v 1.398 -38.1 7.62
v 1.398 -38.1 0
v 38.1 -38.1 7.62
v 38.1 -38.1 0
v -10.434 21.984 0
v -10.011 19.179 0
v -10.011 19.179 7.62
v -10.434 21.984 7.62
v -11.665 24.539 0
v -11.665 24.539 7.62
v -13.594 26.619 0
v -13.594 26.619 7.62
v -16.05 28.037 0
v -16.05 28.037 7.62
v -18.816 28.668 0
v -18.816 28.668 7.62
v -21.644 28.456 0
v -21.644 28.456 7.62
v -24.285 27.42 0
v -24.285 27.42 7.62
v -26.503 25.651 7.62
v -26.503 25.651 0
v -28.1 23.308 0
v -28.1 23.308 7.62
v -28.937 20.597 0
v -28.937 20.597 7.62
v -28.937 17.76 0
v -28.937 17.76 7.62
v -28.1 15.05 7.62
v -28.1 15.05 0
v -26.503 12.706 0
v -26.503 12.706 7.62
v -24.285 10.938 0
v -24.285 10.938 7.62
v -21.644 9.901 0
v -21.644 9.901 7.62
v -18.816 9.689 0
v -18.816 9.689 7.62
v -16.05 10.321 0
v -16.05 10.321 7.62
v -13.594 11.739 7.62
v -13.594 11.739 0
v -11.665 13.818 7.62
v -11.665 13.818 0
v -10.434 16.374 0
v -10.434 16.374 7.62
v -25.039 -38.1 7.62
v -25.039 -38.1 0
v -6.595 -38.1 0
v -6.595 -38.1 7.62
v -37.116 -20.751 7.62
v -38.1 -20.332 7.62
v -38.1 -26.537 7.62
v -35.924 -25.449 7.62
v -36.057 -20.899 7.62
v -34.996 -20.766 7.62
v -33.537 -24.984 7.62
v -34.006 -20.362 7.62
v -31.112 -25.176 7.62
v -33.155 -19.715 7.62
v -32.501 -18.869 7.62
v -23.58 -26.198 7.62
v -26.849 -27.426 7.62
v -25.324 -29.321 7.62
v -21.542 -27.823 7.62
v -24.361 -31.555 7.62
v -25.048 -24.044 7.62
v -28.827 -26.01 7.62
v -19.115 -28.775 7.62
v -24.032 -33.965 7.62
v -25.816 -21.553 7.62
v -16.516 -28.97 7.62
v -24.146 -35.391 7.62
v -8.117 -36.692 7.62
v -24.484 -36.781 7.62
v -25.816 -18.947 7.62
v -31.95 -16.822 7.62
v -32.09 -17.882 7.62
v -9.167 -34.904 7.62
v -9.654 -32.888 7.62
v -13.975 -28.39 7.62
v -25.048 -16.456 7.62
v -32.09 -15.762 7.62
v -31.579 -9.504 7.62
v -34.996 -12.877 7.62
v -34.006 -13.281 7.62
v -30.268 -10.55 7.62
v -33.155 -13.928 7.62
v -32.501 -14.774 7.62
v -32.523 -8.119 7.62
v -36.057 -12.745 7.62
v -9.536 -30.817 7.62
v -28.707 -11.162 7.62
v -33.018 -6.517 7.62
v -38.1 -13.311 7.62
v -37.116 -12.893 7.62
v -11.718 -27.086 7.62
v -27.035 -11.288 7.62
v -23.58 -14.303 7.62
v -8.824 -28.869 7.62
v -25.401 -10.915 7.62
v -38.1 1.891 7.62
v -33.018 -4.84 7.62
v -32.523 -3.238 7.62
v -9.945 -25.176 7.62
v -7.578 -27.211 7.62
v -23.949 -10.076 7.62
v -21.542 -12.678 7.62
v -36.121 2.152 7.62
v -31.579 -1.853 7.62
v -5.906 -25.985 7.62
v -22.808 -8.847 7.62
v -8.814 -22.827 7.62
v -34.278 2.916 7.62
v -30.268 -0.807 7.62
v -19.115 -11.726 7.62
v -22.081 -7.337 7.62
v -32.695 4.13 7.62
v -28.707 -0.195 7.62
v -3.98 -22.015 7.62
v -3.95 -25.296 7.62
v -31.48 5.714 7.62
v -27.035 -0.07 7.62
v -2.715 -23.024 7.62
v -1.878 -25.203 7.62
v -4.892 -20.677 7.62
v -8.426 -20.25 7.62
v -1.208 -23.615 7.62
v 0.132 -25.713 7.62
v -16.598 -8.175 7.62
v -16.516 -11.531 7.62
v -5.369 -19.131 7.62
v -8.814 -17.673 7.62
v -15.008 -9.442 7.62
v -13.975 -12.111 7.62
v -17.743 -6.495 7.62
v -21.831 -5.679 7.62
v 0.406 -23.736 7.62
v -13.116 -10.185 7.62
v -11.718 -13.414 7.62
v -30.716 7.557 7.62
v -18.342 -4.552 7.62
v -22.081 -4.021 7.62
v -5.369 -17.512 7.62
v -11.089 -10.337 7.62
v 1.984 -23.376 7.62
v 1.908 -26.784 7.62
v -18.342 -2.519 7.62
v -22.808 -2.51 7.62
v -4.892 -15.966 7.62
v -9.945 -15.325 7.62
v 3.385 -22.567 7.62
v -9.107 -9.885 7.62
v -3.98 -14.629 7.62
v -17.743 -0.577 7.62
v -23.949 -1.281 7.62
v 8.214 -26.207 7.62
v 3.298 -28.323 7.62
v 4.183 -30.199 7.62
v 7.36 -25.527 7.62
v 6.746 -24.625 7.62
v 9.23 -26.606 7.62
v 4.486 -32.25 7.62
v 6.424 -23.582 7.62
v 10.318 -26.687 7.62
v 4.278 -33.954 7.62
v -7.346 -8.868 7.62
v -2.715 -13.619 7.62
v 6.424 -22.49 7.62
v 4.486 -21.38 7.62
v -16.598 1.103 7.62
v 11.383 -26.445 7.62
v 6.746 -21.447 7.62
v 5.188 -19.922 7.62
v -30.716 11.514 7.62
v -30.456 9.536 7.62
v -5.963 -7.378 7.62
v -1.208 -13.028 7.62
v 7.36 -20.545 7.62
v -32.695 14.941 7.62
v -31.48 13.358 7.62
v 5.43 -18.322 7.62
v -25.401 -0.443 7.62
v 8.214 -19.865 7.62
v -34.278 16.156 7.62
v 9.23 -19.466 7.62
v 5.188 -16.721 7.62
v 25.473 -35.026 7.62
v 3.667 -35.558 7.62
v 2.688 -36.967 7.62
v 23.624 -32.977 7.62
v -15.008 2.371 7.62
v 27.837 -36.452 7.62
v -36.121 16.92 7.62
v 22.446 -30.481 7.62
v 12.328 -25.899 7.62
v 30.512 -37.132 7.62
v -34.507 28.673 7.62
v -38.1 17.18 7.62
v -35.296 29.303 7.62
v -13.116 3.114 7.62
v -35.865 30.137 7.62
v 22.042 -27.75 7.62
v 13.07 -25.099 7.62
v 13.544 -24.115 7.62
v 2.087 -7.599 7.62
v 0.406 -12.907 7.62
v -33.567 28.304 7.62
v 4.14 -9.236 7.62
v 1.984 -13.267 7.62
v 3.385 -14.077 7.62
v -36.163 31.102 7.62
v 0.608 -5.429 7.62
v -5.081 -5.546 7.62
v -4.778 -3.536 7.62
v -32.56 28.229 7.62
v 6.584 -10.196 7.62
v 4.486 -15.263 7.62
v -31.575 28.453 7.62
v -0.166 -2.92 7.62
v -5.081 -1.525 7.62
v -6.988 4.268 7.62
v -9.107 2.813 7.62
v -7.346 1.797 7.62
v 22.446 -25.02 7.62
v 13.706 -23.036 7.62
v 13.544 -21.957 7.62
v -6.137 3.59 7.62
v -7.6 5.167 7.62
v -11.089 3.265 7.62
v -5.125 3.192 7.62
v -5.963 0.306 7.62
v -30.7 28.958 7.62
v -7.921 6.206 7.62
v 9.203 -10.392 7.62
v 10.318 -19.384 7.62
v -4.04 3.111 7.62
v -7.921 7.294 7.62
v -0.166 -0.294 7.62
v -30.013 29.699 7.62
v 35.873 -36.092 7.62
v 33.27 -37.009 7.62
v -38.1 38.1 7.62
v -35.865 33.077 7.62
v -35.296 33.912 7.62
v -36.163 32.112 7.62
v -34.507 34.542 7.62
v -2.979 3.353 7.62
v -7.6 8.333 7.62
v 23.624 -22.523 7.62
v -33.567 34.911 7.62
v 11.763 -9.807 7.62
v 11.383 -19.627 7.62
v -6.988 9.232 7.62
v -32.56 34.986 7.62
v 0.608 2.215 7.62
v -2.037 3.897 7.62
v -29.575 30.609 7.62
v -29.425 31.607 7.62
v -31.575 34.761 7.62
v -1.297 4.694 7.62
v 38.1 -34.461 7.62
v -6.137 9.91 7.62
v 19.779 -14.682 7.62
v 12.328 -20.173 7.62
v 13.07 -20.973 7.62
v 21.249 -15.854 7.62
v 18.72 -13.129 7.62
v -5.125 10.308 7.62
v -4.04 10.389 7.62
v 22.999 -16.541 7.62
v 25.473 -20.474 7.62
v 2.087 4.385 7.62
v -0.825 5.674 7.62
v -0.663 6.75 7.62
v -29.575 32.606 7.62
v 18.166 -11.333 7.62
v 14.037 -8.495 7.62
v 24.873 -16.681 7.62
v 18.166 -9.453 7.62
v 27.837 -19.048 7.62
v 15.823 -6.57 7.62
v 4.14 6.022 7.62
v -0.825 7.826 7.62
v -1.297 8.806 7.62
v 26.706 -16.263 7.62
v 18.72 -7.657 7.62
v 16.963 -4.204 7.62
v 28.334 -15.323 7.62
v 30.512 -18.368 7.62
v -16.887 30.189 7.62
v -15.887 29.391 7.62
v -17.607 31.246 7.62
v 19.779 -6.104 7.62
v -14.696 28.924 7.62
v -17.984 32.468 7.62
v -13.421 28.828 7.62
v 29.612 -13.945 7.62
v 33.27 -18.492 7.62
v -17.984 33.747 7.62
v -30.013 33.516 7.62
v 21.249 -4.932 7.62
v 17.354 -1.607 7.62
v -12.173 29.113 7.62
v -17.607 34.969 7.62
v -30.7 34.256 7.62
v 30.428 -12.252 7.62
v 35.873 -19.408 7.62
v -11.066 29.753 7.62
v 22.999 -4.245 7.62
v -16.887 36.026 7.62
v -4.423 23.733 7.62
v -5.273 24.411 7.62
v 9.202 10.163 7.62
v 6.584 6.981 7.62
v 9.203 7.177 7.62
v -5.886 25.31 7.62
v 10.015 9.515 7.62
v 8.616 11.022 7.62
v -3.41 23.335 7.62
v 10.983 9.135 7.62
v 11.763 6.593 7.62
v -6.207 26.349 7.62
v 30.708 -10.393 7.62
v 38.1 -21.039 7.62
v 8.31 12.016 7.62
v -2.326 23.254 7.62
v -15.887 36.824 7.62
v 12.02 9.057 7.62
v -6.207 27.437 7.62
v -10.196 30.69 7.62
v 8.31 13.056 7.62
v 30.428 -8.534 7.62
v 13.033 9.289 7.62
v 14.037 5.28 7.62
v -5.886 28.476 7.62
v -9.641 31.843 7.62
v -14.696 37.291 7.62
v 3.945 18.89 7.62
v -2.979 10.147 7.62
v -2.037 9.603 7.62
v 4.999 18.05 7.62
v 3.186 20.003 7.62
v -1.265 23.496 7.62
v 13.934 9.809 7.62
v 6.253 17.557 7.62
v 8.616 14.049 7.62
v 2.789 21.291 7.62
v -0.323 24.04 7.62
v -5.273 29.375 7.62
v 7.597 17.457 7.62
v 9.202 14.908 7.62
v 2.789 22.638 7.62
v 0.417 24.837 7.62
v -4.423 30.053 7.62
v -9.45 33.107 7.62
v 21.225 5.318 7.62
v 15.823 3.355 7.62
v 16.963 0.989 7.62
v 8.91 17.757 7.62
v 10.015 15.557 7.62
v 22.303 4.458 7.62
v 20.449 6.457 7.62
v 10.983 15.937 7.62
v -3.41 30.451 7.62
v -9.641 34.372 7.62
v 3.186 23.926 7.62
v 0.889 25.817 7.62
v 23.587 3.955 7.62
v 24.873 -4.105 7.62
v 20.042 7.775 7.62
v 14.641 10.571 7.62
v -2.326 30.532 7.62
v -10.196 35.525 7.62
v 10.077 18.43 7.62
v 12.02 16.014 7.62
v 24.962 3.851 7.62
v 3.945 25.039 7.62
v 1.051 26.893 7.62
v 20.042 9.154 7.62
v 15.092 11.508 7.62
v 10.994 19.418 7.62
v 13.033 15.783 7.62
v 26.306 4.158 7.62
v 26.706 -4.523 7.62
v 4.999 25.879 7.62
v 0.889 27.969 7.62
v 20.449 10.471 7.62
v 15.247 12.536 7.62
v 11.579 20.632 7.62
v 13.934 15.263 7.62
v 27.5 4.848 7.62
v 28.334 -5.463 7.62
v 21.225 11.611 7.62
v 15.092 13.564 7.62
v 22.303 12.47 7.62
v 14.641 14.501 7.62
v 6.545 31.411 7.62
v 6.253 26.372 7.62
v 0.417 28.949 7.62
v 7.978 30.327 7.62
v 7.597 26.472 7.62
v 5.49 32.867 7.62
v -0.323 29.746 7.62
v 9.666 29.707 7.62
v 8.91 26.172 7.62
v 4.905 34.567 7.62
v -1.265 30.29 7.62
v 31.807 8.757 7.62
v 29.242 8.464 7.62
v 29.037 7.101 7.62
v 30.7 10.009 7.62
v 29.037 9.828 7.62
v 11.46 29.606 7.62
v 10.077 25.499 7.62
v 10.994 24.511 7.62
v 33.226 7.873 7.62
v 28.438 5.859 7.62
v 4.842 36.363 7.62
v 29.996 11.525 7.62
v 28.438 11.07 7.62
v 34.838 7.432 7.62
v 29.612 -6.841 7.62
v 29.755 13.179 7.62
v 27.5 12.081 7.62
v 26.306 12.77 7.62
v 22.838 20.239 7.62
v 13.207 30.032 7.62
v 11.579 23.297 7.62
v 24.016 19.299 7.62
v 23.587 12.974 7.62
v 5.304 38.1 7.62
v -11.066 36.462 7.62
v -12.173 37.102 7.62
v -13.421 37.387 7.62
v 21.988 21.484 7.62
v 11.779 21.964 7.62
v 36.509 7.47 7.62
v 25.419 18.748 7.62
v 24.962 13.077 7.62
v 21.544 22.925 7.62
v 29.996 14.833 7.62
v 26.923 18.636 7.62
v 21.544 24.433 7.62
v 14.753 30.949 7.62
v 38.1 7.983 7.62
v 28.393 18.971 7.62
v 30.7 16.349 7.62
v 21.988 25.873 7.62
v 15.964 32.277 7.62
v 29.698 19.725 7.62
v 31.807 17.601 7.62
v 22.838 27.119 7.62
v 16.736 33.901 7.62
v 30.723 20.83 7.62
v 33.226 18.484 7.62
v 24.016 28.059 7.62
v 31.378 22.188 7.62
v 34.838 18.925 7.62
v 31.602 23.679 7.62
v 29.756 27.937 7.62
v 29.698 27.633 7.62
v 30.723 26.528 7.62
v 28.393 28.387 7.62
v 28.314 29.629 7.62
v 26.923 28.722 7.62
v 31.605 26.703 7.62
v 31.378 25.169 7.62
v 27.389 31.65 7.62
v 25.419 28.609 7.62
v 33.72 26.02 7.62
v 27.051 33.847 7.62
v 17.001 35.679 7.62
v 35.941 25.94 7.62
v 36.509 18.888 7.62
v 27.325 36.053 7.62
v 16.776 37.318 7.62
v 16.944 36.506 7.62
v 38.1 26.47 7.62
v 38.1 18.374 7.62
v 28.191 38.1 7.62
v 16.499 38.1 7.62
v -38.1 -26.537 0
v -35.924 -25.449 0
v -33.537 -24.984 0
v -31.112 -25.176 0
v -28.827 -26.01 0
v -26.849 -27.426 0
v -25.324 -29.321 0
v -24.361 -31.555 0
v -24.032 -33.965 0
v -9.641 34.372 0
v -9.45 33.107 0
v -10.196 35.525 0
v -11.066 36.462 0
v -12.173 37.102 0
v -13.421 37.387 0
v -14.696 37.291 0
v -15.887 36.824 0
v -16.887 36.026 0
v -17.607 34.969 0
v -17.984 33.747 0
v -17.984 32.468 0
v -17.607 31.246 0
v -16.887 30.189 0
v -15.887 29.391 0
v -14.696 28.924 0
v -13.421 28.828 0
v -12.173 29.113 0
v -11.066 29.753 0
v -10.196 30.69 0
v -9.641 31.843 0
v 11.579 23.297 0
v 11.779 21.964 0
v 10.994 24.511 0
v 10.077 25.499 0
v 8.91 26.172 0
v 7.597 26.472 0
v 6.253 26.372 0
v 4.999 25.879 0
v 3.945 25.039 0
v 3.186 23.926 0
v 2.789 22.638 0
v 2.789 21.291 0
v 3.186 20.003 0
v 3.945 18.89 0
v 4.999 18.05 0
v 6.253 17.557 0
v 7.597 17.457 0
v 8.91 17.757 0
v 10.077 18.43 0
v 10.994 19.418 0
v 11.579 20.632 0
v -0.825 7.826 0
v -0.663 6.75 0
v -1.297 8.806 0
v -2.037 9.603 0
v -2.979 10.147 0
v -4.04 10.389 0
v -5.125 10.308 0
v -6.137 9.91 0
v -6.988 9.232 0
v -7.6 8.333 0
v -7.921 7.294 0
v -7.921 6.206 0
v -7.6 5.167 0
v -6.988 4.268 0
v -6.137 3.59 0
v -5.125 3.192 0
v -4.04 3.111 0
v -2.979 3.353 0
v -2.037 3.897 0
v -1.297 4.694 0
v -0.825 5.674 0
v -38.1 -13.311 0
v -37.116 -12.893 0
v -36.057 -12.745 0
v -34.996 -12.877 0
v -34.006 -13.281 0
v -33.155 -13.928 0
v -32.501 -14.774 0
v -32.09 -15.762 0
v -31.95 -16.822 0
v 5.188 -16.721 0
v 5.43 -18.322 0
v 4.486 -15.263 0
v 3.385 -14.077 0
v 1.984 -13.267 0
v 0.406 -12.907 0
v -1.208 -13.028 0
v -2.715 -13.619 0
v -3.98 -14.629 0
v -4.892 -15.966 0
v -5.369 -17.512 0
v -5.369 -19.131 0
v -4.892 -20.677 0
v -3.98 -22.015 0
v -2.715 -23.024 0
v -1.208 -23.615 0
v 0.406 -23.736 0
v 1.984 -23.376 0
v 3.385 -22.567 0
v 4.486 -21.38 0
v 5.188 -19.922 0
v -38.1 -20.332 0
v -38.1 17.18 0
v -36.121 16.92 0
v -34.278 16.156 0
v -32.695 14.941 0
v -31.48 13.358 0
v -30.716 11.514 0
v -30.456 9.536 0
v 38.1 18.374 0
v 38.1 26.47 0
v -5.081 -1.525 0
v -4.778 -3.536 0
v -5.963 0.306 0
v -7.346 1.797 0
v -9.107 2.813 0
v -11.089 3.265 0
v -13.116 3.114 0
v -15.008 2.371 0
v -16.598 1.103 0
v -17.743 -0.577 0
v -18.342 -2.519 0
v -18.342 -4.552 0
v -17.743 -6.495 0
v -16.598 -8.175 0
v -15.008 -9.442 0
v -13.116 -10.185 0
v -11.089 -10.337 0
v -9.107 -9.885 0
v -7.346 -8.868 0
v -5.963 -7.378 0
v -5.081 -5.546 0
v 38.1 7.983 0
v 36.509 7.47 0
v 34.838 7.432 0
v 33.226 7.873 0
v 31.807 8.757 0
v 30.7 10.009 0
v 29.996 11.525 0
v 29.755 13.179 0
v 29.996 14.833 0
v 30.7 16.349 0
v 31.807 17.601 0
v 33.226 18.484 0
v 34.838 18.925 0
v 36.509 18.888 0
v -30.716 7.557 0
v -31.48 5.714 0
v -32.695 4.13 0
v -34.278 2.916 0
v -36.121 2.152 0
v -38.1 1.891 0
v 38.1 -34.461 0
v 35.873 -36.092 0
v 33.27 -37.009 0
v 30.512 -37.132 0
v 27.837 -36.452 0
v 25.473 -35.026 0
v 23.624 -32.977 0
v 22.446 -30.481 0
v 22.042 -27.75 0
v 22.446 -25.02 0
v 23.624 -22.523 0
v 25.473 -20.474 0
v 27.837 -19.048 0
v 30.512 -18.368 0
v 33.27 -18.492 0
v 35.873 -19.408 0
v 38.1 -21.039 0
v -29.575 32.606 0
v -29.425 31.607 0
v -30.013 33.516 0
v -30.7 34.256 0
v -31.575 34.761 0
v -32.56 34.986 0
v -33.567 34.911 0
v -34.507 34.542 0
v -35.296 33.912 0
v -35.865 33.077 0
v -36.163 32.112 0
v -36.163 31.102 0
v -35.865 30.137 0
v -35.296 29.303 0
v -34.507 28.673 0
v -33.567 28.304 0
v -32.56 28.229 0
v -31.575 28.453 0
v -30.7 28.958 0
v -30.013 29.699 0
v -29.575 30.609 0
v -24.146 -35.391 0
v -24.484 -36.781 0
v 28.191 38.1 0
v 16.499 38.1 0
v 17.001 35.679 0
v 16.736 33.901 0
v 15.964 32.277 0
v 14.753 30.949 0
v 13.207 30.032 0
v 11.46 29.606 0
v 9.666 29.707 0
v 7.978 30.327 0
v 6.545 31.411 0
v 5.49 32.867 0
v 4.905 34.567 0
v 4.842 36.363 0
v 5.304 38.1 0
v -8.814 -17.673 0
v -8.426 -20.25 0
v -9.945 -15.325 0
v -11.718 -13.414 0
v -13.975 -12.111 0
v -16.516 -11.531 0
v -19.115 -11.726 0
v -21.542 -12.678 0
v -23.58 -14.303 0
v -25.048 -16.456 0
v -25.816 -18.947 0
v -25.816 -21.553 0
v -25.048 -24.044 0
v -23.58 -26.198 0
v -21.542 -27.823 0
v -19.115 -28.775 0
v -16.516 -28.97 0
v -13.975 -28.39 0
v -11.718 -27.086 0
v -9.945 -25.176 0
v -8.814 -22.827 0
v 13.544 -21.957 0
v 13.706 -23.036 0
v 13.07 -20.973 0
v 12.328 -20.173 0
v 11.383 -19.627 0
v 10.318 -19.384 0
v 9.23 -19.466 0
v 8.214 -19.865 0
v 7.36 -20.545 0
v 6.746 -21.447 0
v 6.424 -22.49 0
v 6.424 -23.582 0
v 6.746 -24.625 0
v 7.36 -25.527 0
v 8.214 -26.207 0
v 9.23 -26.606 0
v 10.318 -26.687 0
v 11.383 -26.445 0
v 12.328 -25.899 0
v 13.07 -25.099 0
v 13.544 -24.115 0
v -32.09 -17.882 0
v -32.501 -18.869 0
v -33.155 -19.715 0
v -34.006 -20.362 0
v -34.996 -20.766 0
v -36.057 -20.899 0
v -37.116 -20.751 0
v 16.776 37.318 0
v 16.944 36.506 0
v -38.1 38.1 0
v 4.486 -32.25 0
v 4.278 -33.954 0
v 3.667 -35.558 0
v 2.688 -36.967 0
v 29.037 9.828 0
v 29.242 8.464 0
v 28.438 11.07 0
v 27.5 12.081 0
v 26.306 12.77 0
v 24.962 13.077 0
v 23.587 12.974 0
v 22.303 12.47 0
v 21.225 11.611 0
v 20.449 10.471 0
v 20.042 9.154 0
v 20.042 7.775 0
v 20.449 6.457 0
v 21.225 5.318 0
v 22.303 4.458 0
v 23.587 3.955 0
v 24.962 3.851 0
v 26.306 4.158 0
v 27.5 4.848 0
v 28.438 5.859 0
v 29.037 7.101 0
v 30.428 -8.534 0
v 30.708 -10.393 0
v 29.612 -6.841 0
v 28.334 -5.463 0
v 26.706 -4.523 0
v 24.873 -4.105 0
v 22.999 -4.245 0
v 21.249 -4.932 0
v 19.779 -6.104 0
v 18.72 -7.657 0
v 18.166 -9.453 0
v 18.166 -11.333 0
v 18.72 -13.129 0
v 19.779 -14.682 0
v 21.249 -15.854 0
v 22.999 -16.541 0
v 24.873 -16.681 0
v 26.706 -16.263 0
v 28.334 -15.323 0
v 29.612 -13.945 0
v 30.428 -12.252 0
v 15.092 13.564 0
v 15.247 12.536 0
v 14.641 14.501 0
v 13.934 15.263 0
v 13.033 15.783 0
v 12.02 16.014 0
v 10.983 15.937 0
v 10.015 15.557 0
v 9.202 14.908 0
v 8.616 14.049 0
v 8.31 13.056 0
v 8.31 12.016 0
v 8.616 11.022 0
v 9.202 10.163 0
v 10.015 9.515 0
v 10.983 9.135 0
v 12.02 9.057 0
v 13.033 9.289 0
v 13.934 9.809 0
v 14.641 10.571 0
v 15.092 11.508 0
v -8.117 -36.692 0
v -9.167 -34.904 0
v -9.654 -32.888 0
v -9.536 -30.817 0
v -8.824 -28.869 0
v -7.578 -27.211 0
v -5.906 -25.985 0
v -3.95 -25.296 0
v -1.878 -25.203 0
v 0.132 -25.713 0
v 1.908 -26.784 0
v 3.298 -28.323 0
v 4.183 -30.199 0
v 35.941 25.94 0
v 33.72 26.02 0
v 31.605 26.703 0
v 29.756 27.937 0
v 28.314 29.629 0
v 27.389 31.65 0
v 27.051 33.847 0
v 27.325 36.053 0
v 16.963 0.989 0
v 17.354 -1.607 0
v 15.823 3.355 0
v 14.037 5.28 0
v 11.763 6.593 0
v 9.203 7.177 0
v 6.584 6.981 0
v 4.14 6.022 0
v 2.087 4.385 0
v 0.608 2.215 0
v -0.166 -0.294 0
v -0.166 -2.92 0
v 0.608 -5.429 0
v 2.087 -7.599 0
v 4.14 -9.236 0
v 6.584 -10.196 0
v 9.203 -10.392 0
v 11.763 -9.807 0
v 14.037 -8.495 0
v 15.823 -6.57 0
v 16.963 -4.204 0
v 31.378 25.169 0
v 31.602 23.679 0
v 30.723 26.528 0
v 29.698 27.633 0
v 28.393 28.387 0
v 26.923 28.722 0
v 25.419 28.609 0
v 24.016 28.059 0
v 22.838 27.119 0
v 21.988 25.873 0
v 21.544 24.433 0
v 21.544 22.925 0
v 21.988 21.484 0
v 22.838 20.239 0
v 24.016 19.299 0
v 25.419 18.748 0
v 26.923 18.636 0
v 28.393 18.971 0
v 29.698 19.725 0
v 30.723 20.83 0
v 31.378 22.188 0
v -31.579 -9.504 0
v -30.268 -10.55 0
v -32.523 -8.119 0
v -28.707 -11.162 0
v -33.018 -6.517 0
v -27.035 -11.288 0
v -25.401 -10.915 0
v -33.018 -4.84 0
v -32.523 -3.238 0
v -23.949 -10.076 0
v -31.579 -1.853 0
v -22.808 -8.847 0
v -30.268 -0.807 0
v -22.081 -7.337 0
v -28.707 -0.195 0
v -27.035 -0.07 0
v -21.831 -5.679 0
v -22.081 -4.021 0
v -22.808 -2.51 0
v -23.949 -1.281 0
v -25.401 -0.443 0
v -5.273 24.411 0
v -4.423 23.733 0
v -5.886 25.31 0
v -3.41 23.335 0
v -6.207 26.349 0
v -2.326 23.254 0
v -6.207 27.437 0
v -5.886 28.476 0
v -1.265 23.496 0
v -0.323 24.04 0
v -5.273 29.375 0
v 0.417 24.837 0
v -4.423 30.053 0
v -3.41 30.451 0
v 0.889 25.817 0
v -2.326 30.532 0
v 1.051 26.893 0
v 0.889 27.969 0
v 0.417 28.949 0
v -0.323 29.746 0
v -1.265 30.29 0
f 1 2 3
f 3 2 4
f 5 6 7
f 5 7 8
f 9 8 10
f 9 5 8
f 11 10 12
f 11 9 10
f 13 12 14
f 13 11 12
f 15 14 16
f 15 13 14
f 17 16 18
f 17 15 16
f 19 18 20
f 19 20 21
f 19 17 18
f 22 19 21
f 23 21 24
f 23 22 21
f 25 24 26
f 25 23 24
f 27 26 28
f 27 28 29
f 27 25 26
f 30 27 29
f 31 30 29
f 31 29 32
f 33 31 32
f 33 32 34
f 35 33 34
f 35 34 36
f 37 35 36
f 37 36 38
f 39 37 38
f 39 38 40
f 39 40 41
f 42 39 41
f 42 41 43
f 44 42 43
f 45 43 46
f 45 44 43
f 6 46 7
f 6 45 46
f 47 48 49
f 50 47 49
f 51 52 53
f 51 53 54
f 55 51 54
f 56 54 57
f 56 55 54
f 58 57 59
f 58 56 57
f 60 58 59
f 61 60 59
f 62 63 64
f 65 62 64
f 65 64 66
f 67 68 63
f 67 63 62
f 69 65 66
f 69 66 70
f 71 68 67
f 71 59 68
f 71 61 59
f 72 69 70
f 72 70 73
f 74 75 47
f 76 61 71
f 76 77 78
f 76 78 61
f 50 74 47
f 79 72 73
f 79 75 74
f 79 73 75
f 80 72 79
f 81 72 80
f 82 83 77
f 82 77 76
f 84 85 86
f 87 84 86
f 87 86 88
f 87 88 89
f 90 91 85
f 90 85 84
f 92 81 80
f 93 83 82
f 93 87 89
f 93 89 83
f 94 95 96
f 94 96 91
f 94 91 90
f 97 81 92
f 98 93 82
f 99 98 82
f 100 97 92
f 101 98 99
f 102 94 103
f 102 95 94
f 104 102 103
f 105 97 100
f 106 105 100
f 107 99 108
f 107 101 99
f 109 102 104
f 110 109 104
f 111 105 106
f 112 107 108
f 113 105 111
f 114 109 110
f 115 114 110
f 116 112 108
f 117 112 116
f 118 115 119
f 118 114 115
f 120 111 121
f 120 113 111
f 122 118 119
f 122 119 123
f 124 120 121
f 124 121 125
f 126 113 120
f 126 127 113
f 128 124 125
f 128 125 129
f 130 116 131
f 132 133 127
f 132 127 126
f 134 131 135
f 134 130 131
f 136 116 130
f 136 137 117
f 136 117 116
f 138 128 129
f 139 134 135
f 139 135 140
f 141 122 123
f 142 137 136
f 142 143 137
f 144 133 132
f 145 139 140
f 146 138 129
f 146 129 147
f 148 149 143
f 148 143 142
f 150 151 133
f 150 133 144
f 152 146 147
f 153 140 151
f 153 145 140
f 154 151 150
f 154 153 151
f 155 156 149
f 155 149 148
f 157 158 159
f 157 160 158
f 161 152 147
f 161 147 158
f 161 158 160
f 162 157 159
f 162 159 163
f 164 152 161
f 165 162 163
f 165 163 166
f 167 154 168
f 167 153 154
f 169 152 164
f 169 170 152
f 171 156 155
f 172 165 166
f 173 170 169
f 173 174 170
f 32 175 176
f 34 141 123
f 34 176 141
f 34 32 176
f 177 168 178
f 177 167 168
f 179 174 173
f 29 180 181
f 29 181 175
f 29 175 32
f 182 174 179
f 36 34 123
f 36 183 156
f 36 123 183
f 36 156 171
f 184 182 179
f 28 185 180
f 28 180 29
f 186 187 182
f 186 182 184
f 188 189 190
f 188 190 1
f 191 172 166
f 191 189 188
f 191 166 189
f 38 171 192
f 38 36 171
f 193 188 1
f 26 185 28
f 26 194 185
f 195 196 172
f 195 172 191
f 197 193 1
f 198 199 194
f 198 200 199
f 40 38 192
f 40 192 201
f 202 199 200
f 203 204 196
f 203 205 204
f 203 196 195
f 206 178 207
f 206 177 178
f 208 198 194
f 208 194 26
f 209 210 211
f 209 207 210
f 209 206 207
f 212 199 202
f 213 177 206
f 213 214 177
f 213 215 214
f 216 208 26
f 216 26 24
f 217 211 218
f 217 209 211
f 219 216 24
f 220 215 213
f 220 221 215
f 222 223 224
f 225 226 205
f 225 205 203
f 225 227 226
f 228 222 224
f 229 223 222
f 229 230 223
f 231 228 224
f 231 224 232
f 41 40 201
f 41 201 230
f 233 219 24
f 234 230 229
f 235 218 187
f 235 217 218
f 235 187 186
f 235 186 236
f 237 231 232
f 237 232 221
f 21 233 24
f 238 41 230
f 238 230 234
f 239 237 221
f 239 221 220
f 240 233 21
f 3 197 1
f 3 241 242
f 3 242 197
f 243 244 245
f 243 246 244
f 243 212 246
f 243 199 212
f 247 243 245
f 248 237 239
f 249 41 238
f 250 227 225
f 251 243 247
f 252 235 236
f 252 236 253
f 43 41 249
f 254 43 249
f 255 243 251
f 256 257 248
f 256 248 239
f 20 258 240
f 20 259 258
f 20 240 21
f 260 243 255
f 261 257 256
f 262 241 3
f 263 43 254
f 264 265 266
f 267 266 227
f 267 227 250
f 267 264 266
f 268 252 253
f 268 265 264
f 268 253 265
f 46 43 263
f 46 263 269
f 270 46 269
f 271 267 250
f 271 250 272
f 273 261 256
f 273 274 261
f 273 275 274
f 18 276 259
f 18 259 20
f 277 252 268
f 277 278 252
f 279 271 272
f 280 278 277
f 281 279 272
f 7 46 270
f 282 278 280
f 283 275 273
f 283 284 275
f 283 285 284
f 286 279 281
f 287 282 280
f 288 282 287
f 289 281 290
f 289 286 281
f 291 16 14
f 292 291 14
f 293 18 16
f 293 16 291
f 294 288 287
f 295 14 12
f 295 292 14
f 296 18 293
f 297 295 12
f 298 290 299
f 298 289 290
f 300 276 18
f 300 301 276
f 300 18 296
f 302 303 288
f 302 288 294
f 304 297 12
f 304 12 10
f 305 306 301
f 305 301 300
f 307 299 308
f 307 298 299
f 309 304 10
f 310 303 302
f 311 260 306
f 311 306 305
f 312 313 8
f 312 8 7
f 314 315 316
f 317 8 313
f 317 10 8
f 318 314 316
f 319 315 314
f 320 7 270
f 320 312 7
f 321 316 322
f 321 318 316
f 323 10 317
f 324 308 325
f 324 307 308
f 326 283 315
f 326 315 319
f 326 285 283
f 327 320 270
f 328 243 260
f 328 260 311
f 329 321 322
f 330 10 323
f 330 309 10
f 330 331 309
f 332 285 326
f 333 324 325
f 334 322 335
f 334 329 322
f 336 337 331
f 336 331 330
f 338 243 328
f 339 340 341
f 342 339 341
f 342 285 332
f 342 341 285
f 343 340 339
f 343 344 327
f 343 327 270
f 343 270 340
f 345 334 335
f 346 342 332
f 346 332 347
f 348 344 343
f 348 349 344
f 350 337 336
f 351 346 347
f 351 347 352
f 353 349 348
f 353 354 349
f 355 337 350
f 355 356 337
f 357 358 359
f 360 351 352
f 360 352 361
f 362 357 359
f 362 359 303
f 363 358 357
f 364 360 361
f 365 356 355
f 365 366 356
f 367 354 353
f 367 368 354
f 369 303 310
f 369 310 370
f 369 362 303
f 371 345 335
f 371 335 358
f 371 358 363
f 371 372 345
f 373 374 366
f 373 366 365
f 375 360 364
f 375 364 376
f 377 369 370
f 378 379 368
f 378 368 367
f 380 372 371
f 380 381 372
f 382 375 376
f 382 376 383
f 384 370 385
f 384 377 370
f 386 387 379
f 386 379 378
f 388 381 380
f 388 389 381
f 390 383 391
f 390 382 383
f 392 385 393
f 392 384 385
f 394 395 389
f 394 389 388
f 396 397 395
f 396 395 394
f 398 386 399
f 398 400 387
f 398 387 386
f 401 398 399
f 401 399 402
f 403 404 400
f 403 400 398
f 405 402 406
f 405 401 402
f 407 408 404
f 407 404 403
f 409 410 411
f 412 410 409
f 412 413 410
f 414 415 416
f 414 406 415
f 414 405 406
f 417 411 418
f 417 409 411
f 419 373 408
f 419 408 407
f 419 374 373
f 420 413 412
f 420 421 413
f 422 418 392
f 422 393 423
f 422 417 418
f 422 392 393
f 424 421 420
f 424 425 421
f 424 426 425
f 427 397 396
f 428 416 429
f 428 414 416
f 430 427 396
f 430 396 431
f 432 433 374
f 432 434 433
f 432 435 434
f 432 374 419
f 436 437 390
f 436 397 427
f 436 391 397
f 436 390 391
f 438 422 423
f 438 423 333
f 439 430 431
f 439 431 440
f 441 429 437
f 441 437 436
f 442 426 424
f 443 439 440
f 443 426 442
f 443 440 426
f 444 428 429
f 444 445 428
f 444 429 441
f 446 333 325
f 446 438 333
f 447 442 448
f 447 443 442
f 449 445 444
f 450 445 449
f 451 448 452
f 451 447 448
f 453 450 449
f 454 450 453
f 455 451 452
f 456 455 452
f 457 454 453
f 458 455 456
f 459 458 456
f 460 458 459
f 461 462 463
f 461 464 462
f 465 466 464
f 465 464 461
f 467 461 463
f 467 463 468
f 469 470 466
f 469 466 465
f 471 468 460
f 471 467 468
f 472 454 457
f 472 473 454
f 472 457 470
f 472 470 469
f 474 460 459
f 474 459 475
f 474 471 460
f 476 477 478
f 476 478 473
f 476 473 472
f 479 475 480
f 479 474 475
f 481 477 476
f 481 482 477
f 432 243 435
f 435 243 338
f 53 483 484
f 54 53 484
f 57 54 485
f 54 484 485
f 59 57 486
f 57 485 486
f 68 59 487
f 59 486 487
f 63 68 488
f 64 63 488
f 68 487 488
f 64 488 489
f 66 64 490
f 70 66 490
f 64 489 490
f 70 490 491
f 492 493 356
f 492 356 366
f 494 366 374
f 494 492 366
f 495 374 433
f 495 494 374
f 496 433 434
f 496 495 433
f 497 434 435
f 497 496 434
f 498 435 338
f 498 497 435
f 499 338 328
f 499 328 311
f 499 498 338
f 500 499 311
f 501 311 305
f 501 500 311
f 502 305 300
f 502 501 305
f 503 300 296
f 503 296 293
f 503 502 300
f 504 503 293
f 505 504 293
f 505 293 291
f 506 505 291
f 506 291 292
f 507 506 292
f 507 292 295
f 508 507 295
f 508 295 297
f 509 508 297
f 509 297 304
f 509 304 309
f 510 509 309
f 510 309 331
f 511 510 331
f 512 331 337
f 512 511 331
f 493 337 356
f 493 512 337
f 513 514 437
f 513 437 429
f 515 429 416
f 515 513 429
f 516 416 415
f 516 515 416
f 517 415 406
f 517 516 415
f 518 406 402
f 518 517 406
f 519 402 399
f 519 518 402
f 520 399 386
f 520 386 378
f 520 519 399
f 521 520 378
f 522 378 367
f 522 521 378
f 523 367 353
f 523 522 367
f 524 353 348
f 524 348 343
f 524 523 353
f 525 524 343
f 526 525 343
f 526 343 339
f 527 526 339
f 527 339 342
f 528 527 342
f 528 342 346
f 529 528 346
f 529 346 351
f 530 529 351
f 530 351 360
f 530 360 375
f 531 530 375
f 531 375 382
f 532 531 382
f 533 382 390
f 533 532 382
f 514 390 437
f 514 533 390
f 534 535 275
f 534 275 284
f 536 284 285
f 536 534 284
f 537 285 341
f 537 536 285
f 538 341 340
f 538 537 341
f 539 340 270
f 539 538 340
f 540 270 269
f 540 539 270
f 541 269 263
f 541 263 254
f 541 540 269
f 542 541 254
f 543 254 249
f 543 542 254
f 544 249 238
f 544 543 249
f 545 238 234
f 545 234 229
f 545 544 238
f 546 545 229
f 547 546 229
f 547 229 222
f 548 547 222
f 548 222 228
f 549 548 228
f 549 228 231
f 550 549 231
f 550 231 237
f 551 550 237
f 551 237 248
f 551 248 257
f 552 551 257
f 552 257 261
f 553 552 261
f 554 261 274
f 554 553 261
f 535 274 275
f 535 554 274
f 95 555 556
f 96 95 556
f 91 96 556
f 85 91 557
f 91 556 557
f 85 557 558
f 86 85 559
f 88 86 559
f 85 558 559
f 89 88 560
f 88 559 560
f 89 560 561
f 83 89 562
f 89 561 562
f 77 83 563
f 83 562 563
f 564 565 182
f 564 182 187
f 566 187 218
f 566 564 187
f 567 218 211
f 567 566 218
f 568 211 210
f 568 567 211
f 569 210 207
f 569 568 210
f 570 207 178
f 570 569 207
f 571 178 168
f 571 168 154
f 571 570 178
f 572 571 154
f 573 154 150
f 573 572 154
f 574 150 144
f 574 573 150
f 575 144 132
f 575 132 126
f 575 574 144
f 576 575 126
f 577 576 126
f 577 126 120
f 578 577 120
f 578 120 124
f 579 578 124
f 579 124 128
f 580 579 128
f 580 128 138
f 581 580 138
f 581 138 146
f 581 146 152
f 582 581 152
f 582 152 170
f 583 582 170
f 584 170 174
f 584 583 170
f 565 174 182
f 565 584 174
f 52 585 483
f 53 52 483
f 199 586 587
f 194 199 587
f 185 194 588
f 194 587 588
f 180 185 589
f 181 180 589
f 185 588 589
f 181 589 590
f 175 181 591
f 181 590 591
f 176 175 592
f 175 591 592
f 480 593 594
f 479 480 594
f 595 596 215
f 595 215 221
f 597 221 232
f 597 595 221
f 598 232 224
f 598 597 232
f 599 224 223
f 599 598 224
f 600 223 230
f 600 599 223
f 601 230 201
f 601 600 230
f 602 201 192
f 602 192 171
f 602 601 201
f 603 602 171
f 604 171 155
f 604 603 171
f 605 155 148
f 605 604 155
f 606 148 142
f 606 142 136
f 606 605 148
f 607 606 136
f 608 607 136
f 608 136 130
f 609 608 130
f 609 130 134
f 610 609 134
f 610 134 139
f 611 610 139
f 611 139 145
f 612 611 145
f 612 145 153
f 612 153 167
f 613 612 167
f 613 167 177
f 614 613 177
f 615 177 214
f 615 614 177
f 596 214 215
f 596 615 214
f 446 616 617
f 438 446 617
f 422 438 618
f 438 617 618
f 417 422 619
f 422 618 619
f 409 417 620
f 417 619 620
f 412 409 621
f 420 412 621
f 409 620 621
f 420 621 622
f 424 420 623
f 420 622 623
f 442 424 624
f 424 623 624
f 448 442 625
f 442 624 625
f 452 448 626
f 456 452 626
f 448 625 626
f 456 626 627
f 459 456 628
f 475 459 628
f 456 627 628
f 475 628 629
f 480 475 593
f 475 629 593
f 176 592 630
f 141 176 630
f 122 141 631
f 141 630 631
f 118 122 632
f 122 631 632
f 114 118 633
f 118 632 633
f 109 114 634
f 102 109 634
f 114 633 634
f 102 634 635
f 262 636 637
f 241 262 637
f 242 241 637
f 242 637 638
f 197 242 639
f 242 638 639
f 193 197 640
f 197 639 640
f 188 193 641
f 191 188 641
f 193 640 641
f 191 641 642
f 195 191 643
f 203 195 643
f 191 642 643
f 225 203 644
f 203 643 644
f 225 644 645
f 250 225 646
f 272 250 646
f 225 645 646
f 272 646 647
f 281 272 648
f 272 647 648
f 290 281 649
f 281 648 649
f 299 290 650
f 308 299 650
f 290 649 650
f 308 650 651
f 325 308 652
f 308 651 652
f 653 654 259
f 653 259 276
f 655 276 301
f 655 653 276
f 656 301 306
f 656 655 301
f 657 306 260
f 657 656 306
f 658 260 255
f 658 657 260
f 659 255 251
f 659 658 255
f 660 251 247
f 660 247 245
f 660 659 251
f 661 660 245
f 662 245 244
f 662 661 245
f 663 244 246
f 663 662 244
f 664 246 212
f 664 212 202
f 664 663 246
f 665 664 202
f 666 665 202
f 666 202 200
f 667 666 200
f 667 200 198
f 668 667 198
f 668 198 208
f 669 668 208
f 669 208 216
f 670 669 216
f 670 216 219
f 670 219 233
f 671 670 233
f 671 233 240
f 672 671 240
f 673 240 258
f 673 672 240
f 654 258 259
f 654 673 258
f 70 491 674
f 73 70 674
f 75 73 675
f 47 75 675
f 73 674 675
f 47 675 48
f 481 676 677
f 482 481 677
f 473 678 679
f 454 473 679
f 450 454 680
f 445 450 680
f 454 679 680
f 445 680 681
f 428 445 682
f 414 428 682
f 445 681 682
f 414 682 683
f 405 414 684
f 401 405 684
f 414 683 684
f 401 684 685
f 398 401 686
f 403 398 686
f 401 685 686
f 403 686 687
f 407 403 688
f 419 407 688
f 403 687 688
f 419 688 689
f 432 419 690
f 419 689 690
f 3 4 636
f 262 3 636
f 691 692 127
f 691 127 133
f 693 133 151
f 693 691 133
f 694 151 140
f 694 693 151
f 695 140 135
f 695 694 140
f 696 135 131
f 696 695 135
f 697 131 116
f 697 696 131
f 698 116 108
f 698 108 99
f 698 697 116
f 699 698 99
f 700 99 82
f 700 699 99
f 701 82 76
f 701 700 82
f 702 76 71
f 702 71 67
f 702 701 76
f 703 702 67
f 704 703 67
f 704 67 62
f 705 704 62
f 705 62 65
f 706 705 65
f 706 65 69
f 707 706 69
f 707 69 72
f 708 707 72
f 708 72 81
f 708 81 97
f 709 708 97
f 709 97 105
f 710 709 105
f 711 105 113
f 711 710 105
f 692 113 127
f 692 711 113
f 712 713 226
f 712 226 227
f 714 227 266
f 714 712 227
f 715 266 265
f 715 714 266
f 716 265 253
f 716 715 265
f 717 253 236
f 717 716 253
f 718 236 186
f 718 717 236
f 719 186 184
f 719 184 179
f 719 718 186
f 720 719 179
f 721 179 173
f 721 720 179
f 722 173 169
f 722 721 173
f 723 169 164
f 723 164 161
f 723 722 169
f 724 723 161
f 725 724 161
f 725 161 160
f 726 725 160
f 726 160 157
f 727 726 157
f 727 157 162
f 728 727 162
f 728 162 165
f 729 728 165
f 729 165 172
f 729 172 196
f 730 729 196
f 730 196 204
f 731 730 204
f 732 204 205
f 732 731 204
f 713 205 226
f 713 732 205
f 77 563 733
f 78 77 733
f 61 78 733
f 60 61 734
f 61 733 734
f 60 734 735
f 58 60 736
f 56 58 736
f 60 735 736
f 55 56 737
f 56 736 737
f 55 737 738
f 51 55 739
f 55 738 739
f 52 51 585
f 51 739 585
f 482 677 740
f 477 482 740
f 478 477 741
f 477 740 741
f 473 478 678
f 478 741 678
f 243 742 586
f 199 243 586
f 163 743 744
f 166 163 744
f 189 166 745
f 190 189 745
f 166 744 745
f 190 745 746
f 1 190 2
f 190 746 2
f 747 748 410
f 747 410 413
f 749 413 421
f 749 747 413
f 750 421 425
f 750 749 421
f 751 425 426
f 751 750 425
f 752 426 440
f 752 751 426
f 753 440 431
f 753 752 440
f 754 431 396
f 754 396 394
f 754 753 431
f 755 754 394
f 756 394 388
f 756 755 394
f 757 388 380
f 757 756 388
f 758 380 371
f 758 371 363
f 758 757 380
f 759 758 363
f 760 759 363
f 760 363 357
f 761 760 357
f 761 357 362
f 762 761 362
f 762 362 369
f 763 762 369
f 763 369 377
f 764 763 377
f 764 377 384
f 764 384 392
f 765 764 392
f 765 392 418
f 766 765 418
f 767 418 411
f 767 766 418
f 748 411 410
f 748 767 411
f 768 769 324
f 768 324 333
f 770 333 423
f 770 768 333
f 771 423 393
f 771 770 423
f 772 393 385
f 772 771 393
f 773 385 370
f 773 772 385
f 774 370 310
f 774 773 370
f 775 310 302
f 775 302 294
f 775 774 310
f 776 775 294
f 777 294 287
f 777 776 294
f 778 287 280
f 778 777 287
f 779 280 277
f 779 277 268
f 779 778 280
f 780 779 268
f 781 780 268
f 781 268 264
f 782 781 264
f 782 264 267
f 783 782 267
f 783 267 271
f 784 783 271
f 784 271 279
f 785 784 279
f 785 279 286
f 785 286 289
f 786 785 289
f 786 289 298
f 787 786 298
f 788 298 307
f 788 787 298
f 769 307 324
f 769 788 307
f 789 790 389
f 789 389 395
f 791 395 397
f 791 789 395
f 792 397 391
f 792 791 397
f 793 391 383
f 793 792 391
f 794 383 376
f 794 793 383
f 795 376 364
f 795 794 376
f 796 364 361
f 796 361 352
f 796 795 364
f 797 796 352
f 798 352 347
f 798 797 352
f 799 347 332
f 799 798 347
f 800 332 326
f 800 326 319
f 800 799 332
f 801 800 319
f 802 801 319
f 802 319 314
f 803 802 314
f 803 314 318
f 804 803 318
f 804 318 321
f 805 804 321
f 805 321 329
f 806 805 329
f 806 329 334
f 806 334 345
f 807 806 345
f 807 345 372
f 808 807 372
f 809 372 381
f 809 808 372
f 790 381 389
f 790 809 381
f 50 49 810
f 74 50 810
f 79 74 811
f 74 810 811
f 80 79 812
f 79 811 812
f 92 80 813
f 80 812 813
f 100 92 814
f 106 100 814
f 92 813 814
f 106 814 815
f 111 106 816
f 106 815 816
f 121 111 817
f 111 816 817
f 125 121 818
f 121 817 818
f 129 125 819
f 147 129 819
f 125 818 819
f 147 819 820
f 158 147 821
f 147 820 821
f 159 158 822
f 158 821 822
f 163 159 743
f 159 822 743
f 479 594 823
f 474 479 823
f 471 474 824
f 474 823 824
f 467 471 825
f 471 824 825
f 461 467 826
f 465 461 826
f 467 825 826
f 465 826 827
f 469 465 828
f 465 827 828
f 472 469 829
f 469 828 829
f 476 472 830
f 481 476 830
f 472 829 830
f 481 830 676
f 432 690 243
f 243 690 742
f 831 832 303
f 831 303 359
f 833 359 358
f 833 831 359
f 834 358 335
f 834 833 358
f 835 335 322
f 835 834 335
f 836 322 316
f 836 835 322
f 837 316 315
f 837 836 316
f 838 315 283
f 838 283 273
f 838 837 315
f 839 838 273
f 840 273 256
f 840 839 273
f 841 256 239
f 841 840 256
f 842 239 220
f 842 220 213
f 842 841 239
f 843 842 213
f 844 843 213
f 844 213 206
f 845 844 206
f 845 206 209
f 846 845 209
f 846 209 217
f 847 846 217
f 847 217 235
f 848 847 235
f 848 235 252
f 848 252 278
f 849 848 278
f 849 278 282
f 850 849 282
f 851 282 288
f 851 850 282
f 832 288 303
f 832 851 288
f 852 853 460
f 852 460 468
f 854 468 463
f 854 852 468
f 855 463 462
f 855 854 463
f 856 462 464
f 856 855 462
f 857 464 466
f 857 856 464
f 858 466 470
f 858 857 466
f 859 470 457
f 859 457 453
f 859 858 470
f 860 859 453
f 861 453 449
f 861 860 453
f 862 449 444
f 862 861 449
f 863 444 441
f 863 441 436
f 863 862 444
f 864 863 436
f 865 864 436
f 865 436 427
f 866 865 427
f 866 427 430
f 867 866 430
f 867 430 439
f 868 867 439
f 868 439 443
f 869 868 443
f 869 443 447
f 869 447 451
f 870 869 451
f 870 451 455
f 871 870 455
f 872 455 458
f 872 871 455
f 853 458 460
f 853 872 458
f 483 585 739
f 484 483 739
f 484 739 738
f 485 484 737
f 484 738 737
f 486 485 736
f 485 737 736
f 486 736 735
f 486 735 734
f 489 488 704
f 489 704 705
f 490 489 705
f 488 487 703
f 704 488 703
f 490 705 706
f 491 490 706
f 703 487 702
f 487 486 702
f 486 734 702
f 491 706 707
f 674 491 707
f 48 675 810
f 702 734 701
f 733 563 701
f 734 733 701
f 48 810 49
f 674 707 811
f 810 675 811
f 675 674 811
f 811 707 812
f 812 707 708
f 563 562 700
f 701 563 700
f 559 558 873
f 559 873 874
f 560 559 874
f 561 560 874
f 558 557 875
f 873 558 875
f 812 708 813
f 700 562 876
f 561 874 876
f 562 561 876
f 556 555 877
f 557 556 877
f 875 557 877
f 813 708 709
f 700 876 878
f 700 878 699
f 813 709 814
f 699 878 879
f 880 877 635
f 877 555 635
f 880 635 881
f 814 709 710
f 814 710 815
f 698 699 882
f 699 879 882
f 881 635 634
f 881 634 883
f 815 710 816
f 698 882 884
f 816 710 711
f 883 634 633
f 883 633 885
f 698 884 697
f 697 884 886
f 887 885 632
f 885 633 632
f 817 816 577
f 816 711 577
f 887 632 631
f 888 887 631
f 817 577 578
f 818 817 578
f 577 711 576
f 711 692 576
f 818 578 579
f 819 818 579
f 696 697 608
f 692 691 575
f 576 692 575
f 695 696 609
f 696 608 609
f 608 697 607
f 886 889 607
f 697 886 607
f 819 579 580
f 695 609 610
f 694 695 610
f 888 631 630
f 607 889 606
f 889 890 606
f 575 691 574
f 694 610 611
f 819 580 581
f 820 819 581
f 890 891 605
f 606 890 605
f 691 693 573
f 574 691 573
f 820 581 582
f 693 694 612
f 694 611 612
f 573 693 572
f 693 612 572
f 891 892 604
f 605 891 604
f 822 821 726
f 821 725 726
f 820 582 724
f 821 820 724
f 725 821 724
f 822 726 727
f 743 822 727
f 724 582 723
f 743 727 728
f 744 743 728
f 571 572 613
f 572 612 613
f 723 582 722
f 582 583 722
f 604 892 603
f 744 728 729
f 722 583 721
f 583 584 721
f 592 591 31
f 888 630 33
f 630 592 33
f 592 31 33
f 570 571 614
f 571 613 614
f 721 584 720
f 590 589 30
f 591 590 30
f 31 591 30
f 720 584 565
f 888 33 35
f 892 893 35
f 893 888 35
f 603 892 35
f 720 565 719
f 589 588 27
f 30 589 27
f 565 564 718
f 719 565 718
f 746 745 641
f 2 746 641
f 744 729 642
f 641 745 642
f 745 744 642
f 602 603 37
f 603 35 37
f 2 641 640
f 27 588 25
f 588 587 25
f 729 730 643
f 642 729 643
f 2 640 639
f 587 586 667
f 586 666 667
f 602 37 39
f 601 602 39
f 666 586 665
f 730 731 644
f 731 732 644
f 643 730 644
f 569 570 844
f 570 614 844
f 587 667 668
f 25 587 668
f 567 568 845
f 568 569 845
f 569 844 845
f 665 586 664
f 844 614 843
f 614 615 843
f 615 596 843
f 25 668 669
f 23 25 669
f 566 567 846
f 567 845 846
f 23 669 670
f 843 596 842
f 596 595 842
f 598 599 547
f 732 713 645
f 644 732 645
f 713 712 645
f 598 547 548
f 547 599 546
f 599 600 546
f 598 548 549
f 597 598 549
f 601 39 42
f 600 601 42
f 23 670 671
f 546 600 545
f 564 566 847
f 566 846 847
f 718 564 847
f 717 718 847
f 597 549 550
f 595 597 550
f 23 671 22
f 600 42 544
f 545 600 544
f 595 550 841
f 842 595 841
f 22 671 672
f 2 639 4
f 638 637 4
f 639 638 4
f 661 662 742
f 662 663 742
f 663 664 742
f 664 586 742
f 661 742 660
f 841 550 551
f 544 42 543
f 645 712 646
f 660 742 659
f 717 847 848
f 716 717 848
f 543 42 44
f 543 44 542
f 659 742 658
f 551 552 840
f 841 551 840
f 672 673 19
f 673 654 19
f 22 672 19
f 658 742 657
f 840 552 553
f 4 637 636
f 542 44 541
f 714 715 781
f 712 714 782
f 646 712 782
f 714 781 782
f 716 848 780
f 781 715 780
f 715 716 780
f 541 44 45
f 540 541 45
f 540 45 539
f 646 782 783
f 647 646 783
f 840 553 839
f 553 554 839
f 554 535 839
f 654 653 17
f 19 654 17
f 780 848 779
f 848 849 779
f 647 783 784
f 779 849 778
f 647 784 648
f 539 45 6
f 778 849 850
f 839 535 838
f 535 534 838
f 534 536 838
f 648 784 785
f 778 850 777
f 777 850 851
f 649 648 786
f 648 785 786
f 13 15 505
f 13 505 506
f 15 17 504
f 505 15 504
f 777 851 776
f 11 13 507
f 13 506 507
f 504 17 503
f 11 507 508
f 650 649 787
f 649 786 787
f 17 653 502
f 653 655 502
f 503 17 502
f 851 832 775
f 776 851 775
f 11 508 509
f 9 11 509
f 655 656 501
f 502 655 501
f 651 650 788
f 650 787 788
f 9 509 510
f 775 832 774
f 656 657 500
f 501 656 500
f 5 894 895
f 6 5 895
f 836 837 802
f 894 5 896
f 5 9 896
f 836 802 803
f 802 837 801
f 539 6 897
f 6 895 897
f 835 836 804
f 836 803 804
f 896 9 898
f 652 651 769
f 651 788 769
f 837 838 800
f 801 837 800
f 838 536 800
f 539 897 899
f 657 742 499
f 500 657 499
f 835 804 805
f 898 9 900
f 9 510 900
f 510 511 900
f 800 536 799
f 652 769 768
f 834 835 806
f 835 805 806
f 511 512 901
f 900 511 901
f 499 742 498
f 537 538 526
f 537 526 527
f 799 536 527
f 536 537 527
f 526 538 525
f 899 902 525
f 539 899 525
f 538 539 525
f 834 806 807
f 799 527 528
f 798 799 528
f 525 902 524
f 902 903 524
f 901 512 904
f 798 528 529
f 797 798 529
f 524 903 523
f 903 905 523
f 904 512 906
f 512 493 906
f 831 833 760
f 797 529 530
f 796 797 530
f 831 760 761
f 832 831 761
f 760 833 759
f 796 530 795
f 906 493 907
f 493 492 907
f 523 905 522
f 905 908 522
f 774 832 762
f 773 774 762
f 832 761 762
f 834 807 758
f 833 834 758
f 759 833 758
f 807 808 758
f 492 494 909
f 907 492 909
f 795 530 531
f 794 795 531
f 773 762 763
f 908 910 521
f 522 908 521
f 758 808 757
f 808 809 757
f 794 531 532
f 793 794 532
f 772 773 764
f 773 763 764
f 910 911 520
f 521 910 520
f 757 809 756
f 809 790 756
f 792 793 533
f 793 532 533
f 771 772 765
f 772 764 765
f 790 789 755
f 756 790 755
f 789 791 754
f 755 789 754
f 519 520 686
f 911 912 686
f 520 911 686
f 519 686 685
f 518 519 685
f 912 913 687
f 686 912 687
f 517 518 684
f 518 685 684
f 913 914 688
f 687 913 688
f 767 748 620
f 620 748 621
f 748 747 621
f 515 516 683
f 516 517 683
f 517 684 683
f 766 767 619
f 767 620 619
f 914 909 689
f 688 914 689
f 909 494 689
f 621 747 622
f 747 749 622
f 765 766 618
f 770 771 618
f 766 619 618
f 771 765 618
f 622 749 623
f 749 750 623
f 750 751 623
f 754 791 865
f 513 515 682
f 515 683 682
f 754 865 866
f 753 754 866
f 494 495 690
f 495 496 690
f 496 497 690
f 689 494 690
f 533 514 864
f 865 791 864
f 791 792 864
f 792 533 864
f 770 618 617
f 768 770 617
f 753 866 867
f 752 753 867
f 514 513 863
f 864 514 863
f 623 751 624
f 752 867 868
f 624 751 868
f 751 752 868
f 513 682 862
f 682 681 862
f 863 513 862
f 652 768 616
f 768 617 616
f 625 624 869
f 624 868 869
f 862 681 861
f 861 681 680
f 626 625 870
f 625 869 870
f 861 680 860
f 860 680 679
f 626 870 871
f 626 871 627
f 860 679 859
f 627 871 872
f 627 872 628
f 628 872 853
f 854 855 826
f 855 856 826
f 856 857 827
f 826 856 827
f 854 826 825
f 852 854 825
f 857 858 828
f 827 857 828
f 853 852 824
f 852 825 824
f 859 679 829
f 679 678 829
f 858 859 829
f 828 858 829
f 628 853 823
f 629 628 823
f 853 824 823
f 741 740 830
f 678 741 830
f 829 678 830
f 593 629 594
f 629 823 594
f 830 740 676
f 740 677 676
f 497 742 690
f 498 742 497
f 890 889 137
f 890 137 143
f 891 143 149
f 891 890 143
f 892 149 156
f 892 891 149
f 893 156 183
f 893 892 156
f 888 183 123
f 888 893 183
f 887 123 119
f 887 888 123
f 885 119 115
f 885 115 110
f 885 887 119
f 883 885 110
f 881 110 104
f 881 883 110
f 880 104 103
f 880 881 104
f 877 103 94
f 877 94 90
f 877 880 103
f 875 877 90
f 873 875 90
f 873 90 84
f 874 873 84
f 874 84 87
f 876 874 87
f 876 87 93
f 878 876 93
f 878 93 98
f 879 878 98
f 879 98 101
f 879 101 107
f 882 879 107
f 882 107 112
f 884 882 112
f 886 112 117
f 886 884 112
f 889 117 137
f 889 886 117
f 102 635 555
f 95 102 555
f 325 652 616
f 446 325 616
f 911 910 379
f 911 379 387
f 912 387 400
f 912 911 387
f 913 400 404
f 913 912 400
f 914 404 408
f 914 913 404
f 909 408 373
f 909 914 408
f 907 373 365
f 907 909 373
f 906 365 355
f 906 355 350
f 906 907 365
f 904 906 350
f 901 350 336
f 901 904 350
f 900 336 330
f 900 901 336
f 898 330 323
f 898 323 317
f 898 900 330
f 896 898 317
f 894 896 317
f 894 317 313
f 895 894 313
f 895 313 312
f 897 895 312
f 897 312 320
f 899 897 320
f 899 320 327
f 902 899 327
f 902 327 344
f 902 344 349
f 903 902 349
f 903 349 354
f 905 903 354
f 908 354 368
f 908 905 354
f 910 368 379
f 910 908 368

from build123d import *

# Parameters (mm, degrees)
F0_R     = 5.624793
F0_R_2   = 8.743876
F0_R_3   = 6.820271
F0_R_4   = 3.661746
F0_R_5   = 5.429622
F0_R_6   = 8.809277
F0_R_7   = 6.306028
F0_R_8   = 3.649185
F0_R_9   = 9.51591
F0_R_10  = 3.388182
F0_R_11  = 3.649186
F0_R_12  = 4.291104
F0_R_13  = 3.488347
F0_R_14  = 4.625832
F0_R_15  = 4.5204
F0_R_16  = 5.057367
F1_DEPTH = 7.62


with BuildPart() as f1:
    # F0 (on Top) → F1 (new body)
    with BuildSketch(Plane.XY):
        with BuildLine():
            ThreePointArc((38.1, 26.47022), (28.9765, 28.732993), (28.190642, 38.1))
            Line((28.190642, 38.1), (16.499434, 38.1))
            ThreePointArc((16.499434, 38.1), (16.874, 36.915099), (17.000607, 35.678871))
            ThreePointArc((17.000607, 35.678871), (9.665649, 29.706748), (5.304319, 38.1))
            Line((5.304319, 38.1), (-38.1, 38.1))
            Line((-38.1, 38.1), (-38.1, 17.180183))
            ThreePointArc((-38.1, 17.180183), (-32.694602, 14.941194), (-30.455614, 9.535796))
            ThreePointArc((-30.455614, 9.535796), (-32.694602, 4.130398), (-38.1, 1.89141))
            Line((-38.1, 1.89141), (-38.1, -13.310762))
            ThreePointArc((-38.1, -13.310762), (-34.005794, -13.280793), (-31.949991, -16.821569))
            ThreePointArc((-31.949991, -16.821569), (-34.005794, -20.362345), (-38.1, -20.332376))
            Line((-38.1, -20.332376), (-38.1, -26.536592))
            ThreePointArc((-38.1, -26.536592), (-28.827146, -26.010312), (-24.032091, -33.964571))
            ThreePointArc((-24.032091, -33.964571), (-24.287465, -36.092705), (-25.039087, -38.1))
            Line((-25.039087, -38.1), (-6.594518, -38.1))
            ThreePointArc((-6.594518, -38.1), (-5.905659, -25.985243), (4.486227, -32.25027))
            ThreePointArc((4.486227, -32.25027), (3.666791, -35.557694), (1.398047, -38.1))
            Line((1.398047, -38.1), (38.1, -38.1))
            Line((38.1, -38.1), (38.1, -34.461013))
            ThreePointArc((38.1, -34.461013), (22.042395, -27.750231), (38.1, -21.039449))
            Line((38.1, -21.039449), (38.1, 7.983235))
            ThreePointArc((38.1, 7.983235), (29.755205, 13.178684), (38.1, 18.374132))
            Line((38.1, 18.374132), (38.1, 26.47022))
        make_face()
        with Locations((-27.455587, -5.678618)):
            Circle(F0_R, mode=Mode.SUBTRACT)
        with Locations((-17.169787, -20.250168)):
            Circle(F0_R_2, mode=Mode.SUBTRACT)
        with Locations((-11.598311, -3.535743)):
            Circle(F0_R_3, mode=Mode.SUBTRACT)
        with Locations((10.044727, -23.035906)):
            Circle(F0_R_4, mode=Mode.SUBTRACT)
        with Locations((0, -18.321581)):
            Circle(F0_R_5, mode=Mode.SUBTRACT)
        with Locations((8.544715, -1.607155)):
            Circle(F0_R_6, mode=Mode.SUBTRACT)
        with Locations((24.401991, -10.392943)):
            Circle(F0_R_7, mode=Mode.SUBTRACT)
        with Locations((-4.312536, 6.750058)):
            Circle(F0_R_8, mode=Mode.SUBTRACT)
        with Locations((-19.526949, 19.178735)):
            Circle(F0_R_9, mode=Mode.SUBTRACT)
        with Locations((-32.812774, 31.607412)):
            Circle(F0_R_10, mode=Mode.SUBTRACT)
        with Locations((-2.598236, 26.893085)):
            Circle(F0_R_11, mode=Mode.SUBTRACT)
        with Locations((-13.741186, 33.107422)):
            Circle(F0_R_12, mode=Mode.SUBTRACT)
        with Locations((11.759028, 12.535821)):
            Circle(F0_R_13, mode=Mode.SUBTRACT)
        with Locations((24.616279, 8.464358)):
            Circle(F0_R_14, mode=Mode.SUBTRACT)
        with Locations((7.25899, 21.964472)):
            Circle(F0_R_15, mode=Mode.SUBTRACT)
        with Locations((26.544867, 23.678772)):
            Circle(F0_R_16, mode=Mode.SUBTRACT)
    extrude(amount=F1_DEPTH)


solid = f1.part
